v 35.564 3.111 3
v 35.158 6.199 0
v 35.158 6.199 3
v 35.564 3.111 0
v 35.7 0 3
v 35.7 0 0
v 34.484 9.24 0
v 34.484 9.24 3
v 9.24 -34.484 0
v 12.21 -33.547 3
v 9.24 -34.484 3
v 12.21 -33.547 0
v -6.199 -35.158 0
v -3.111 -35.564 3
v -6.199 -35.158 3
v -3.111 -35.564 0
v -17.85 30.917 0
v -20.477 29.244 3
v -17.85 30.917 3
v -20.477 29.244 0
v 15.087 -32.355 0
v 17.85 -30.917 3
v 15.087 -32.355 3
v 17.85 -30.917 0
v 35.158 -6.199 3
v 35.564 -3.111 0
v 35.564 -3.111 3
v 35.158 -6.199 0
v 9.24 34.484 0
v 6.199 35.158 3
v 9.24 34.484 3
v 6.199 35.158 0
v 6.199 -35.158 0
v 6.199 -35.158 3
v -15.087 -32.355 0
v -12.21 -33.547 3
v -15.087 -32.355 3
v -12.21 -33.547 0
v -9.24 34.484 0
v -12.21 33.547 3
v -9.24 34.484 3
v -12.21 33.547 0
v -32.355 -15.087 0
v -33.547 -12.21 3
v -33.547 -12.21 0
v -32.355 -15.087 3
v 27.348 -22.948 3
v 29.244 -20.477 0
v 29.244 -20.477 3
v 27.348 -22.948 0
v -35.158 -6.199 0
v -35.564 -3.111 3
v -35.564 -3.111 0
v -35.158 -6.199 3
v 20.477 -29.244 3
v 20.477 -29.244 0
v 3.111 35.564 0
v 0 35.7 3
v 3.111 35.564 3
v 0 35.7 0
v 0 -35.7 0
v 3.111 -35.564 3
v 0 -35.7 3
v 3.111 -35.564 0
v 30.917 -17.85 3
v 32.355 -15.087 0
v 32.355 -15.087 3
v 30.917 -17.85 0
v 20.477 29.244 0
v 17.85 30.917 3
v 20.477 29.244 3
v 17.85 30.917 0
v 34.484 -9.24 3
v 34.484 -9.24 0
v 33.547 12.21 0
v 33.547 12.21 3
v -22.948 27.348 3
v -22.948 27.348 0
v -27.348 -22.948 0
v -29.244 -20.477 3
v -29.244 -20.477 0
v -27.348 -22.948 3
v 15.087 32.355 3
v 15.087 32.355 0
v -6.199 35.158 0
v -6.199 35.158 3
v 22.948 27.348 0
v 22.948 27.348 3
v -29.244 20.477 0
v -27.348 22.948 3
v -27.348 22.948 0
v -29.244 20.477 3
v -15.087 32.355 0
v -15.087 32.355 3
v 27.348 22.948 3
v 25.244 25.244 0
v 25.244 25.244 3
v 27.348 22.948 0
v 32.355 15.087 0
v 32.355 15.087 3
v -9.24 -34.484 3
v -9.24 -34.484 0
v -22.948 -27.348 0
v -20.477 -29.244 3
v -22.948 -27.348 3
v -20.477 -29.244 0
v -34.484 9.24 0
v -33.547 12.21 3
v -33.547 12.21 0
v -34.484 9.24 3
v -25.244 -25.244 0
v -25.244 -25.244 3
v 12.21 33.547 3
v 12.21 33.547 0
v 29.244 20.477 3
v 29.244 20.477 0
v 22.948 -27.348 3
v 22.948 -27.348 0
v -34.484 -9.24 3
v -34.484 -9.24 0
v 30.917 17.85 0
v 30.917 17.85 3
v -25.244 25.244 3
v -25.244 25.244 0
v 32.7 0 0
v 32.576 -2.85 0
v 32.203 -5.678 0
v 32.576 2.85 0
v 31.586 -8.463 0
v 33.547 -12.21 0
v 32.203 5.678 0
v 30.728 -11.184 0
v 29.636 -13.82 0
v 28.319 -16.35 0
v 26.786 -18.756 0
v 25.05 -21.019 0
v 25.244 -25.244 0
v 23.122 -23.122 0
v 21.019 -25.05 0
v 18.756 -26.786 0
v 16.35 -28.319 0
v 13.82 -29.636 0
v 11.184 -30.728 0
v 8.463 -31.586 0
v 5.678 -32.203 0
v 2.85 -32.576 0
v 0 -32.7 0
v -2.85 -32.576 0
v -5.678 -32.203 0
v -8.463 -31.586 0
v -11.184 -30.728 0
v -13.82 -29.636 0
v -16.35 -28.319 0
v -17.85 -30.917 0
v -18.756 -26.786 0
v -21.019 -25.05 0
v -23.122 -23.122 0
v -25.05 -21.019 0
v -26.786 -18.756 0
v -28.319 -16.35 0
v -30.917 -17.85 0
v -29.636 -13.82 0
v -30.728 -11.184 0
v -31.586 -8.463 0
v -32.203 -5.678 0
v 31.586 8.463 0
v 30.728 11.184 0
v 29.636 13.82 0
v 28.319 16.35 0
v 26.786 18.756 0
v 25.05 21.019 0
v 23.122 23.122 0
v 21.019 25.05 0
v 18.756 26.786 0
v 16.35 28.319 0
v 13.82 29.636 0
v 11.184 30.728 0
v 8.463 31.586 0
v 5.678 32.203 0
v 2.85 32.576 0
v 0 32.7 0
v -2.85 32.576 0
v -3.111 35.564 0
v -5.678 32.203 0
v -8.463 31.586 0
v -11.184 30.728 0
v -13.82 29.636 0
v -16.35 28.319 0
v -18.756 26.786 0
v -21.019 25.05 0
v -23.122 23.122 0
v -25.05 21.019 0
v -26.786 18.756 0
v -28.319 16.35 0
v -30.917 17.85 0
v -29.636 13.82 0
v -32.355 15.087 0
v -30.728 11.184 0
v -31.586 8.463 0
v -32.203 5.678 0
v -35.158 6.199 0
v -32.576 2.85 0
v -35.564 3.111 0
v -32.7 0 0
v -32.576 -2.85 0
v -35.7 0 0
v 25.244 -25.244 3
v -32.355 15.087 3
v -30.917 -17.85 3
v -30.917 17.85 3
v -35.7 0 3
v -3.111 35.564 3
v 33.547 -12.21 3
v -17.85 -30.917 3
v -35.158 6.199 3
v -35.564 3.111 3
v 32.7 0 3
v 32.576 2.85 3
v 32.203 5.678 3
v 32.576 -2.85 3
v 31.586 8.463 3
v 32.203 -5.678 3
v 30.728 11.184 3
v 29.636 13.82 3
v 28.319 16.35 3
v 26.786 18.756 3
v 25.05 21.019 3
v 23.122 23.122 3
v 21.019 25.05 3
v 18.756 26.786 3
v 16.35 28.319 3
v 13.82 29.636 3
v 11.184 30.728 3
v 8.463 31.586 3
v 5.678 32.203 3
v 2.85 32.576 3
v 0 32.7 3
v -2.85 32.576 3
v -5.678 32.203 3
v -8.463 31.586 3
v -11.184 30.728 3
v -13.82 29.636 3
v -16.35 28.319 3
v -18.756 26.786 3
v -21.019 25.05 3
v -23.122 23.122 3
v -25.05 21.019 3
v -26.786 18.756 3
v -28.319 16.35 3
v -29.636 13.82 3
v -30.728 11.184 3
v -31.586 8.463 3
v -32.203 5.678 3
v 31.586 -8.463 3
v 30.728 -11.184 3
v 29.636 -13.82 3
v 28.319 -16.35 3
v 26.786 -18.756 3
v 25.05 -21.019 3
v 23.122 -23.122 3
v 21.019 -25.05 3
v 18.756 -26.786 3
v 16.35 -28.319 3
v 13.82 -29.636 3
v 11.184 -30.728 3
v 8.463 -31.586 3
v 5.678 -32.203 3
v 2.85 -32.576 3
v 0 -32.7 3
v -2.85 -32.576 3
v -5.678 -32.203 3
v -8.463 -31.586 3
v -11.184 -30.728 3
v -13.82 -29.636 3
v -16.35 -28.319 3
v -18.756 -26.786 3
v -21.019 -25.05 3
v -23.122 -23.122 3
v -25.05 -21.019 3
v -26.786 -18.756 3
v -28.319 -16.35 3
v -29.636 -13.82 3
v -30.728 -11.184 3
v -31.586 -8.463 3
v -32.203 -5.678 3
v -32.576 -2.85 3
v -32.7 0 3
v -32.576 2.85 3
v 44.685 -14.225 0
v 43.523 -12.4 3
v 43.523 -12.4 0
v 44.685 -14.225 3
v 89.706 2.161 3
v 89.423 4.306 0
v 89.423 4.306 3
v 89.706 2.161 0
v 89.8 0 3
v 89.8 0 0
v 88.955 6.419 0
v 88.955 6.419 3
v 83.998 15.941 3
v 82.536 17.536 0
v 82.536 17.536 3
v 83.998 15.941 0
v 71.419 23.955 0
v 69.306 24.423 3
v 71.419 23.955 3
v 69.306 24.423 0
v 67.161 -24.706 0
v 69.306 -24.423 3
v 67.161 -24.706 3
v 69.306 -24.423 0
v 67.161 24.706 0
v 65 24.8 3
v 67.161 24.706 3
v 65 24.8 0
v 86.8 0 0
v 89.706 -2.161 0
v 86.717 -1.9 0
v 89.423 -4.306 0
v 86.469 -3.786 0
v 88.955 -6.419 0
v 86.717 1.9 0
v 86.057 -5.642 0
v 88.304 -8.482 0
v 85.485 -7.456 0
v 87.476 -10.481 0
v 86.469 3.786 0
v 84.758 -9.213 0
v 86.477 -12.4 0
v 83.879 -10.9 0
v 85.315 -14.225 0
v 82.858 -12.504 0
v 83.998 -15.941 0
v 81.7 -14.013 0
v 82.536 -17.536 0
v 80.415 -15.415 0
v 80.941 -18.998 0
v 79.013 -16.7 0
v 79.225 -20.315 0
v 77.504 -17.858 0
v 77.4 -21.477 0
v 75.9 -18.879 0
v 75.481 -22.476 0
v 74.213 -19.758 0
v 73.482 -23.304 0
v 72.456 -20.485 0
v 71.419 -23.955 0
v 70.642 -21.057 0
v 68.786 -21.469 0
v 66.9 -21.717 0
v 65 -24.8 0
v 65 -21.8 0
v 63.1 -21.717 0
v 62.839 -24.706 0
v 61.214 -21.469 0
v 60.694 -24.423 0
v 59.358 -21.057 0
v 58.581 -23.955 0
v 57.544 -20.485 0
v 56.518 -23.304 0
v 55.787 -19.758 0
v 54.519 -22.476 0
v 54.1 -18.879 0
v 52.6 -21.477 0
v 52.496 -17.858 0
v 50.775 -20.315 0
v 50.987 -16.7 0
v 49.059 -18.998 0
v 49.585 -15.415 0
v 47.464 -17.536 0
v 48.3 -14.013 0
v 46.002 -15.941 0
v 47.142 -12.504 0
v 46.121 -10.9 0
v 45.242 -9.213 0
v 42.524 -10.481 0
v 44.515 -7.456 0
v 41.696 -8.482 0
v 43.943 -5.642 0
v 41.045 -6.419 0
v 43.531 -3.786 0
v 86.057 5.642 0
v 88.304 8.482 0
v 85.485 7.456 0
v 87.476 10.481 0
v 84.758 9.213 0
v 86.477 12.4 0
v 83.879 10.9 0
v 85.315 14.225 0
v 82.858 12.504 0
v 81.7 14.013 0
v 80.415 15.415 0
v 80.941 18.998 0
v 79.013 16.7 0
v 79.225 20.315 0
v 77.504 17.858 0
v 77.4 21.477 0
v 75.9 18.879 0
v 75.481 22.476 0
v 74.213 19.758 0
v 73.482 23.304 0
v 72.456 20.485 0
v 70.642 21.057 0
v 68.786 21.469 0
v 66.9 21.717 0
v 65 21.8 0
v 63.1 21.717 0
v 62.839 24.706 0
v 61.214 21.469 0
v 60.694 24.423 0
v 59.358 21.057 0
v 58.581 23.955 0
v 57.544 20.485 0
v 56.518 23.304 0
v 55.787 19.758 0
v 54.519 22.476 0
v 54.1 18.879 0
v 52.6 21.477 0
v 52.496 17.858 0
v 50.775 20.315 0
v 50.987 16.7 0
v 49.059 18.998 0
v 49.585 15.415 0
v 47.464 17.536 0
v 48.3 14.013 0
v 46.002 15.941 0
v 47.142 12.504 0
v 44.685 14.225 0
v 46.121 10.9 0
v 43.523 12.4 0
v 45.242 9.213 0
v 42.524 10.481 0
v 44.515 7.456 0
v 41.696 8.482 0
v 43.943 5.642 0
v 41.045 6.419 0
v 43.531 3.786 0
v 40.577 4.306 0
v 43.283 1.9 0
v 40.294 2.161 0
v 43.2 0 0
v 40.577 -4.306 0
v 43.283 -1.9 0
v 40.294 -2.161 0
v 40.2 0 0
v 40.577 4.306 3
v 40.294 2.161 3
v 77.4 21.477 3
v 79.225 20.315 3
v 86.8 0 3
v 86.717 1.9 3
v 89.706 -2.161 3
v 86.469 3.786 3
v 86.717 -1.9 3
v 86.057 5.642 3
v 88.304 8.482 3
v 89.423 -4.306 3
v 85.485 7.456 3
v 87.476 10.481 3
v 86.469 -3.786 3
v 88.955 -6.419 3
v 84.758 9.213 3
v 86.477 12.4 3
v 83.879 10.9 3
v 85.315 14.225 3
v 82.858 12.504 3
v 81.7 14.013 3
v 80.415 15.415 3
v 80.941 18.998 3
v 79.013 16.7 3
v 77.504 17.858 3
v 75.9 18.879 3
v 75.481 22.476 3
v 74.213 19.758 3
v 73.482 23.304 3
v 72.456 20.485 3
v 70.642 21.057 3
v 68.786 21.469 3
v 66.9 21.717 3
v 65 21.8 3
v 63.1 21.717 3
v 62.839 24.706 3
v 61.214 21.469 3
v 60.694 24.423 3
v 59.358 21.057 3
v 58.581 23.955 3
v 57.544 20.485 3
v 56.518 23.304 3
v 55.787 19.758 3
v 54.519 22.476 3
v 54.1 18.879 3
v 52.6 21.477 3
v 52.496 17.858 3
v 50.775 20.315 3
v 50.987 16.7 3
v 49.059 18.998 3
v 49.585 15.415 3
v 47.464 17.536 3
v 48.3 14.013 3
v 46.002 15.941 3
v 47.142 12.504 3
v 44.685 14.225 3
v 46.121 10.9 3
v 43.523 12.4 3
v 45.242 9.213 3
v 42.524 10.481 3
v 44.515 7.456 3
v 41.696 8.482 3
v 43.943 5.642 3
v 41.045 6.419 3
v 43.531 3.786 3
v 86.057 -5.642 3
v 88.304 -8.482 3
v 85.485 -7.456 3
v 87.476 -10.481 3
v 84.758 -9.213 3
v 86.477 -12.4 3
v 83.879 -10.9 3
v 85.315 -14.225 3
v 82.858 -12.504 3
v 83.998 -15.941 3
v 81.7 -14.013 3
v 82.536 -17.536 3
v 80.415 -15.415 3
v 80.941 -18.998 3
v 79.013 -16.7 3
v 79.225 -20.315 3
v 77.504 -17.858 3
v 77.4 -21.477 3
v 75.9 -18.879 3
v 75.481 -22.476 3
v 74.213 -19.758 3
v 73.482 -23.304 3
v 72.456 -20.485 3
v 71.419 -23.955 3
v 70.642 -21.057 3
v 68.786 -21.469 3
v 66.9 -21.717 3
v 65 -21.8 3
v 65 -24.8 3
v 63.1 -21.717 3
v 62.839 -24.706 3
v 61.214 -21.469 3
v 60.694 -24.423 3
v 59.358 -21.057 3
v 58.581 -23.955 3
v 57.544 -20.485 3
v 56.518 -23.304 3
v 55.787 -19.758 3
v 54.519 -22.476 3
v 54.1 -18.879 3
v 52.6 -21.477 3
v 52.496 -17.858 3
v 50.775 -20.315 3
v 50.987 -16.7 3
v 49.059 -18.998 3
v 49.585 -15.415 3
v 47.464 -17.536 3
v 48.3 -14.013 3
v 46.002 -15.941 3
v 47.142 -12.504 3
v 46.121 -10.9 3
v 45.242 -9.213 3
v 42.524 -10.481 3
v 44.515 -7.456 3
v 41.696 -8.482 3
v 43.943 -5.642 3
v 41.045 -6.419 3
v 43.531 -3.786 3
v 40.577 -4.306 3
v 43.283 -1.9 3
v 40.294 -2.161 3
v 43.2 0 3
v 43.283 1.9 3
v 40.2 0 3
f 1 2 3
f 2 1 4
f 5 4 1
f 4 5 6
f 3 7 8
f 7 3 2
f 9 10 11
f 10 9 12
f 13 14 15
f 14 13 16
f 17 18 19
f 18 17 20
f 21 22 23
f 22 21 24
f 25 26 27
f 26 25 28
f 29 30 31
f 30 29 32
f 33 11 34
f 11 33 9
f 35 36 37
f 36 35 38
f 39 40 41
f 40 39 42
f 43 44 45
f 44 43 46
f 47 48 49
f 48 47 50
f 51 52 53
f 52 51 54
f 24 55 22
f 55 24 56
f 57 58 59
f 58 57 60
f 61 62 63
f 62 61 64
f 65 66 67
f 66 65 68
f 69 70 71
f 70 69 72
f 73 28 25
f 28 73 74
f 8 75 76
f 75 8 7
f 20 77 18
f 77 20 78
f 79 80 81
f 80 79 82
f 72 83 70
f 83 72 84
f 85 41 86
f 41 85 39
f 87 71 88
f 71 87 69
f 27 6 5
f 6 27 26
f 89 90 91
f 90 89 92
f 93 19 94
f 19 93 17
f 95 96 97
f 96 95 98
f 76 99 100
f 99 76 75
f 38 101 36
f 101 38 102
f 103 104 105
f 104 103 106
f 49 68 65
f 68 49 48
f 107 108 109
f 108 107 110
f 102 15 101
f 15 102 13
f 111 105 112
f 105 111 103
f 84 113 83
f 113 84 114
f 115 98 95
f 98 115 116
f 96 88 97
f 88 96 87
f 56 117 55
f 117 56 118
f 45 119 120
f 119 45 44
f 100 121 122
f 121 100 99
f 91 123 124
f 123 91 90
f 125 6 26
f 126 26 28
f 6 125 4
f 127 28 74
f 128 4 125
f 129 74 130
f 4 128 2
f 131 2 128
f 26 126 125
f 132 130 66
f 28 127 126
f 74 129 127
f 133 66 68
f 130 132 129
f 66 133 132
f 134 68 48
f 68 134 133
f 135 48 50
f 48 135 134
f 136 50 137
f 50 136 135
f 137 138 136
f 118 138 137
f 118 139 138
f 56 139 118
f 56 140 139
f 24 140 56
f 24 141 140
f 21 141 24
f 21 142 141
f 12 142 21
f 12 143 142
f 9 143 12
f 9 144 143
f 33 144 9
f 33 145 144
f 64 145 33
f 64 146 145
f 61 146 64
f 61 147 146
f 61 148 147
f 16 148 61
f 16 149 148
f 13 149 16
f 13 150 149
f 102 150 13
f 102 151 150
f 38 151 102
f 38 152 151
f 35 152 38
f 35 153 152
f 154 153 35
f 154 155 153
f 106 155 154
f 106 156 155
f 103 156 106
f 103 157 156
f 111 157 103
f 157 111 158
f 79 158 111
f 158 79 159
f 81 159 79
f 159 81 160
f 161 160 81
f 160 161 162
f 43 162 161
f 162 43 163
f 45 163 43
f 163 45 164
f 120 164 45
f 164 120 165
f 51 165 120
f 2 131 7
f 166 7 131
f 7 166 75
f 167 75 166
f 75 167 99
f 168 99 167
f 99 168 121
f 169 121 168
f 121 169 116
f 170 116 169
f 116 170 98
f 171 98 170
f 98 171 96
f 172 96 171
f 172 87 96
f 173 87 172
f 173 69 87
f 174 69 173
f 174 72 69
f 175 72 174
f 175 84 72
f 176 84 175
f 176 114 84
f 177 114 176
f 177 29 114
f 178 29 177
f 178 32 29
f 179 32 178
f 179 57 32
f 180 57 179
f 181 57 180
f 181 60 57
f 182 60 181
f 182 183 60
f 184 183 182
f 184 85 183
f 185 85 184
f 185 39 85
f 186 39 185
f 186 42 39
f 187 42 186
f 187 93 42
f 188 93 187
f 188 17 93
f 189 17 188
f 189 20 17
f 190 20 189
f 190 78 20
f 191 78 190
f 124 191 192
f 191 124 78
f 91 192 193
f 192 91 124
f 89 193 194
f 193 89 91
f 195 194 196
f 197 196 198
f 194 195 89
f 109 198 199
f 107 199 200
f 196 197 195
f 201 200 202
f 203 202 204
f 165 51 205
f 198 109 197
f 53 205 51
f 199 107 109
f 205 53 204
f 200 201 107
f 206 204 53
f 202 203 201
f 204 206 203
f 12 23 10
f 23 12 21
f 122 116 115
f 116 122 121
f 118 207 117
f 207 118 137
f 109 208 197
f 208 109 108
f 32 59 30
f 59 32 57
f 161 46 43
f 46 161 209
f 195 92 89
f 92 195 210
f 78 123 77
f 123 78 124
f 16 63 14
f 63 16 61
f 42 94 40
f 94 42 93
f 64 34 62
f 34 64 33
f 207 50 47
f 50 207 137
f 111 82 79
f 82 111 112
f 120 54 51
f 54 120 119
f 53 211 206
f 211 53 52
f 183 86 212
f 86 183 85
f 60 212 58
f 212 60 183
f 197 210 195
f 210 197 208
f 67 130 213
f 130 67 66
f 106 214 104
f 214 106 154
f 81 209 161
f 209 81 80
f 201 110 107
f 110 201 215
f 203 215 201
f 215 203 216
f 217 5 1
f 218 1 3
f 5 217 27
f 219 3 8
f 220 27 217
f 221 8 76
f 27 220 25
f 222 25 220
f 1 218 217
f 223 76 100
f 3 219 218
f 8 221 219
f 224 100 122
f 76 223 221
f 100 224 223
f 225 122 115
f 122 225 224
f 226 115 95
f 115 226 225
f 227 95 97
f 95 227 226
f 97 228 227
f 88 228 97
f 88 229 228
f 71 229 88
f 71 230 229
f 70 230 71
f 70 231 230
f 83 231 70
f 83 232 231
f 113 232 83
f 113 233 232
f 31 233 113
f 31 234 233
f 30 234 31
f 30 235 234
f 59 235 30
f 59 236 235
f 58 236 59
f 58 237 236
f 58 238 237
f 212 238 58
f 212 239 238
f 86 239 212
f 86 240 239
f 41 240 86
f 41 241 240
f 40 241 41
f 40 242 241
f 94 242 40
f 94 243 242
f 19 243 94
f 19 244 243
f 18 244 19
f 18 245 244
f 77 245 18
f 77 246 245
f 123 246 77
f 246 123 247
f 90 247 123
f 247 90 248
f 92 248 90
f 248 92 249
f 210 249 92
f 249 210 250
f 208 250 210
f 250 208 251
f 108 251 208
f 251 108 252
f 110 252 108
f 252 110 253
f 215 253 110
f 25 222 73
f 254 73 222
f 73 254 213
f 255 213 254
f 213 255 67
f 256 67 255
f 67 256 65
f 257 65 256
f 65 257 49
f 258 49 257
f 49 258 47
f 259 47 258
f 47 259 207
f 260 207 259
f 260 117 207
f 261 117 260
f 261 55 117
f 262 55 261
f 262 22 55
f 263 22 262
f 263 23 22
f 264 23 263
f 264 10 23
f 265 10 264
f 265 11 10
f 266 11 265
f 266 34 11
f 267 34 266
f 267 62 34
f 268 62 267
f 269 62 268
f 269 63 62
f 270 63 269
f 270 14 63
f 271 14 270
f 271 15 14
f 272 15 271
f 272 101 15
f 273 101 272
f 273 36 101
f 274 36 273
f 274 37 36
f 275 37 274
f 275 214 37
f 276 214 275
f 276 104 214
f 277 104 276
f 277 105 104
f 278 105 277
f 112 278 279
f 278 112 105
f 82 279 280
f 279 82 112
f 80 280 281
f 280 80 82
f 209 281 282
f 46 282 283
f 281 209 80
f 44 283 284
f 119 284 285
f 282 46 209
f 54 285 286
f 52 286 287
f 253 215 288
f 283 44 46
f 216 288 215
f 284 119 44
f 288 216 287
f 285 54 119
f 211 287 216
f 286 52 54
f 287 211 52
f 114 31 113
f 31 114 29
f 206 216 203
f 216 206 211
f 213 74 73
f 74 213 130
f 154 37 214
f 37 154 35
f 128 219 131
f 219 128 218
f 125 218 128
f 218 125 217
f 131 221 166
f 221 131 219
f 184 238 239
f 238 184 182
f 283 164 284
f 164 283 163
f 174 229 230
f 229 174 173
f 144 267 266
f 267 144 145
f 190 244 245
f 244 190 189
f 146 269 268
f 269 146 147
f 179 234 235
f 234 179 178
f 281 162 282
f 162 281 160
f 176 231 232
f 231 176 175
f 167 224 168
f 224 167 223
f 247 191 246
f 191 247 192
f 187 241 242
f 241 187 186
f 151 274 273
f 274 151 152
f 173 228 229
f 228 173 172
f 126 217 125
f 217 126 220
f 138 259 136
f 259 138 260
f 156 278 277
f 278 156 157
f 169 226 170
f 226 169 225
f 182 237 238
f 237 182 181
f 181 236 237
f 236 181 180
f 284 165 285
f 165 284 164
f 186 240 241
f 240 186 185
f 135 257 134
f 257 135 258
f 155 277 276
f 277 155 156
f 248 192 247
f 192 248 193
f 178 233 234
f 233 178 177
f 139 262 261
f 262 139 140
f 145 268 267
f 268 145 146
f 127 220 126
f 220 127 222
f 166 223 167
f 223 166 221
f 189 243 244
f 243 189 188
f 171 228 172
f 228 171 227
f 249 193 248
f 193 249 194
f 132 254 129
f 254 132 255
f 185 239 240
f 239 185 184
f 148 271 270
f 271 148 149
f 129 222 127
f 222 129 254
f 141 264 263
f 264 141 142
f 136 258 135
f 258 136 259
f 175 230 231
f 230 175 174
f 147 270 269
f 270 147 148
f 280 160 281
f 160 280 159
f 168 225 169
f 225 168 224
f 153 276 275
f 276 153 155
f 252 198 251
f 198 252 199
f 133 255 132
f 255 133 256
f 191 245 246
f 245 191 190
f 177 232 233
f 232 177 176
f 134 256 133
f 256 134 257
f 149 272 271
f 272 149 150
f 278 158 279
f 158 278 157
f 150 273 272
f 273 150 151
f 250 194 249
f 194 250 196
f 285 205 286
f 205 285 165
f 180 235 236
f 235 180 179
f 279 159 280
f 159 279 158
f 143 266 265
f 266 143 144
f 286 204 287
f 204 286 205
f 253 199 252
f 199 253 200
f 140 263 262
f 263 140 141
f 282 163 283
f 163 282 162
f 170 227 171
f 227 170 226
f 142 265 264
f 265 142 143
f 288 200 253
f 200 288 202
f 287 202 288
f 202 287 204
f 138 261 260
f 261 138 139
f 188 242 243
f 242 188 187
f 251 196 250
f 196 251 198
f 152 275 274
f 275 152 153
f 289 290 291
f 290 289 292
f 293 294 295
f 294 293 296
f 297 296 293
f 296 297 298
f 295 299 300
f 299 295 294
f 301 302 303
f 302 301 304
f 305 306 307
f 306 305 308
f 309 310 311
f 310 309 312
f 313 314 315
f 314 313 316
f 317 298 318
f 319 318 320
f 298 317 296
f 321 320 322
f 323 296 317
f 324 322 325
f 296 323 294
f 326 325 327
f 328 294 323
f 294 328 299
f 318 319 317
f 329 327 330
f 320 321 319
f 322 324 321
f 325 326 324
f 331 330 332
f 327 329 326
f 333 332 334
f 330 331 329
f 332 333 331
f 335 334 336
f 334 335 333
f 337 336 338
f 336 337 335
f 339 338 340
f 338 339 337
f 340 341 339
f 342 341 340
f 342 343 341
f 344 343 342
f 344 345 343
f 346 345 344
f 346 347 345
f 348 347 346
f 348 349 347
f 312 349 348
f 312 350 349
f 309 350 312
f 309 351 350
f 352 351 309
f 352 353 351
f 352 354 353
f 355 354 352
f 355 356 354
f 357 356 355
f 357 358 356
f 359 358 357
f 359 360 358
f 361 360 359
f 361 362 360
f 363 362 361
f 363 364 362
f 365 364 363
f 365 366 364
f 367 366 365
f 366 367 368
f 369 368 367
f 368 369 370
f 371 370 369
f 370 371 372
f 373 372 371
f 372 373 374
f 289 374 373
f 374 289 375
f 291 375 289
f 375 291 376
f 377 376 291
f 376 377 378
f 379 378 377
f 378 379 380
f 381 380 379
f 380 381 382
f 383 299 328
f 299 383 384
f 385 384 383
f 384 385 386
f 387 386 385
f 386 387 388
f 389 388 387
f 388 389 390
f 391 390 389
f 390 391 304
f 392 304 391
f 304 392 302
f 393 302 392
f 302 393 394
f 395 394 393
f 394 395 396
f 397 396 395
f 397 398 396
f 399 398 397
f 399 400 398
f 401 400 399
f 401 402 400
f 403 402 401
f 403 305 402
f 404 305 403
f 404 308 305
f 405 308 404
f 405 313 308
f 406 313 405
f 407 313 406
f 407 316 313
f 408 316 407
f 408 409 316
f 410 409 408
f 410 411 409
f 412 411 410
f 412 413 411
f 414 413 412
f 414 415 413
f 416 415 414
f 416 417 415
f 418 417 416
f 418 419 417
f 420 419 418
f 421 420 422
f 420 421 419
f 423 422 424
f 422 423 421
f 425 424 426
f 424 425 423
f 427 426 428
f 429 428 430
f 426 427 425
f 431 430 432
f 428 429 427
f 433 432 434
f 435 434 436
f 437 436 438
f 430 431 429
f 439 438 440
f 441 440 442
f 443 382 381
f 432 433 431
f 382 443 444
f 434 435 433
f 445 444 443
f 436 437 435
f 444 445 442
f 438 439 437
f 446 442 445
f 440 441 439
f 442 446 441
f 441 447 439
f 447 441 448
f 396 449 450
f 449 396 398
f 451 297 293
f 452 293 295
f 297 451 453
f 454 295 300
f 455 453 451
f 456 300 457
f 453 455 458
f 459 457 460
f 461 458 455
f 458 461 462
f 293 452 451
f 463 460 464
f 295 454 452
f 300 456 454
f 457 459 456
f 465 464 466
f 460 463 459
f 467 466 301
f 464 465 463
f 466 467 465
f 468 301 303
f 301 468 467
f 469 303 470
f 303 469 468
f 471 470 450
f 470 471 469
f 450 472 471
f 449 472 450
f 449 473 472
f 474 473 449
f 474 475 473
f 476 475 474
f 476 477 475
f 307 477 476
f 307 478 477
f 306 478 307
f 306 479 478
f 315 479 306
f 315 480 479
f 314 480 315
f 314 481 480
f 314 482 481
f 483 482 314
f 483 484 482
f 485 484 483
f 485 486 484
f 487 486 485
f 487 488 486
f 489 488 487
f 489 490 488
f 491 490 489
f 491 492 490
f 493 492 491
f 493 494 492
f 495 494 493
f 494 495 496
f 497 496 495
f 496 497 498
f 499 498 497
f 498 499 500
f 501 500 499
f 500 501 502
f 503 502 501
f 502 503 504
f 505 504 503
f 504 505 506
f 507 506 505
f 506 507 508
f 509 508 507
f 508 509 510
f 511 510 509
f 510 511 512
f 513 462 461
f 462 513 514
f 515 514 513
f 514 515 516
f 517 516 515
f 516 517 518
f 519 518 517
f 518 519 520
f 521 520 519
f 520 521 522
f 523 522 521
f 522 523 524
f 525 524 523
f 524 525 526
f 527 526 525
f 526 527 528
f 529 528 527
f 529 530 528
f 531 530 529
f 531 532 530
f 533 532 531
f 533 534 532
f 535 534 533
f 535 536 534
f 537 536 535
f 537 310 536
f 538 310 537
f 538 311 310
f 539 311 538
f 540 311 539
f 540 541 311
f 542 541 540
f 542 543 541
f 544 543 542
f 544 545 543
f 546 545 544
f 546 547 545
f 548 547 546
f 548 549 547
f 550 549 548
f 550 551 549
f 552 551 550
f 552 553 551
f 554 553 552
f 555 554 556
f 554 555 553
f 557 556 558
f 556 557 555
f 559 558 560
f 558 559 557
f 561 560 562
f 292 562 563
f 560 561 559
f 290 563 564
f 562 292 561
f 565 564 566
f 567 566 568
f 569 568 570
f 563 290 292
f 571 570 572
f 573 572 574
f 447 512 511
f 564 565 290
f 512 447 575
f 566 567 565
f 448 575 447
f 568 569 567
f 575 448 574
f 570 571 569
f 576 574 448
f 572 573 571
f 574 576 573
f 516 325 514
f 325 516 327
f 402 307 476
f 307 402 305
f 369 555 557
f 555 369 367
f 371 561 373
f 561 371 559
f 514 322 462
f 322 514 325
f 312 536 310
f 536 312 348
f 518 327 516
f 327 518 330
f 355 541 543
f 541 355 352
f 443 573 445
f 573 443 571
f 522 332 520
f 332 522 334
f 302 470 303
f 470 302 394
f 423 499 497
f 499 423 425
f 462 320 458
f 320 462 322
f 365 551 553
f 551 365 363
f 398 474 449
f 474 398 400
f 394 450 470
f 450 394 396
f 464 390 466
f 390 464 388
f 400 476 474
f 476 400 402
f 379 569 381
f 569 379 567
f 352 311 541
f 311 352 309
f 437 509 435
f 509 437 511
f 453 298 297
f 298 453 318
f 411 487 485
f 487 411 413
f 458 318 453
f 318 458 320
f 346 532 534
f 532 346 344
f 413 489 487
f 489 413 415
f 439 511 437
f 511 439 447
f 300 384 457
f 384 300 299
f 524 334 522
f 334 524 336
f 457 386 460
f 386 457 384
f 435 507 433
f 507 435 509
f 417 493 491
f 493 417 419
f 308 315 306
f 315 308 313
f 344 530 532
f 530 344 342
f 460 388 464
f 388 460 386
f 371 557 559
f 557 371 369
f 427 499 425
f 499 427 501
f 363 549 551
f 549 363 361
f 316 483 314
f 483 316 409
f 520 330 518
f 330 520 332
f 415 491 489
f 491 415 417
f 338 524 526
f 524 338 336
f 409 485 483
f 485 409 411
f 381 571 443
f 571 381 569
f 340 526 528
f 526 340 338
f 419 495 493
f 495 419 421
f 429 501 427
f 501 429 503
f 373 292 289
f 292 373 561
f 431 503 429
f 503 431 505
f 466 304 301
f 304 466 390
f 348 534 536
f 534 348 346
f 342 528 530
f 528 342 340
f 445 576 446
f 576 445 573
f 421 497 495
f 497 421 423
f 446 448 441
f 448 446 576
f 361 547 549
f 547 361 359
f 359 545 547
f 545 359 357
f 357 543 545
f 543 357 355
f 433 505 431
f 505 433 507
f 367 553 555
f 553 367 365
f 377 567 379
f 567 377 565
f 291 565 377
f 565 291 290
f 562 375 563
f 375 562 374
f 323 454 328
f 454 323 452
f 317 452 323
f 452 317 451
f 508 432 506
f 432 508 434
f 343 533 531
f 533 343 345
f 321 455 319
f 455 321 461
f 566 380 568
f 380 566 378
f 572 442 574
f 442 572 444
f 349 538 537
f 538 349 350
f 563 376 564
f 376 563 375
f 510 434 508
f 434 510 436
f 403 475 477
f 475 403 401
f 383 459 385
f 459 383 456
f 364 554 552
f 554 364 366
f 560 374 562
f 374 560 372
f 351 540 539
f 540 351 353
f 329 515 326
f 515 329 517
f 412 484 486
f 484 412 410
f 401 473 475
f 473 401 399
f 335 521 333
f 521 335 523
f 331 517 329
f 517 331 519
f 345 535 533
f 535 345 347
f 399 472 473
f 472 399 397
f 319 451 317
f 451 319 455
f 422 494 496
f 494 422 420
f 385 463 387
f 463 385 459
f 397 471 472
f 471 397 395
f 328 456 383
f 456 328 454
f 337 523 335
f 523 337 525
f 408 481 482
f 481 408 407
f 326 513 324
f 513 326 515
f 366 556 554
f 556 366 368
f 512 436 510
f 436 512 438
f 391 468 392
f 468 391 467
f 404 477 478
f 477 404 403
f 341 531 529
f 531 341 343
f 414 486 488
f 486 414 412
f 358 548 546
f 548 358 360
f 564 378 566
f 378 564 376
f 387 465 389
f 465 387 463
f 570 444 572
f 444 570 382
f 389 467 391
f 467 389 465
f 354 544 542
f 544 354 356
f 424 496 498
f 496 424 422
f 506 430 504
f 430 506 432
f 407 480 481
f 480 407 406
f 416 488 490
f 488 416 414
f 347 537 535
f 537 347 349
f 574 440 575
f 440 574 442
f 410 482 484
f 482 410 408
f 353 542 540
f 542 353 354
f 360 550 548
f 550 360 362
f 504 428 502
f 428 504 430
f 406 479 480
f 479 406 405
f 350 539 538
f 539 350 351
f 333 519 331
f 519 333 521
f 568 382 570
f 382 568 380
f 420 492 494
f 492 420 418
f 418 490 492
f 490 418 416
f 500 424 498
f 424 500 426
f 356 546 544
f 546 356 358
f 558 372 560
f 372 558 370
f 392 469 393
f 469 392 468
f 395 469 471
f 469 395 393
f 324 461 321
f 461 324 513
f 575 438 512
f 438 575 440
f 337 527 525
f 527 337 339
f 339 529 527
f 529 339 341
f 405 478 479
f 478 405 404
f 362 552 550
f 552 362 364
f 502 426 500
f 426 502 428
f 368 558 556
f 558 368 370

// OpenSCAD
// file: hand2_params_a.scad
ov      = 0.05;
d_comp  = 0.4;

d_bear_i = 50;
d_bear_o = 65;
r_bear_i  = ( d_bear_i - d_comp ) / 2;
r_bear_o  = ( d_bear_o + d_comp ) / 2 ;
h_bear    =  7.0;

h_force = 3.0;
l_force = 3.0;
h_all   = h_bear + h_force;
h_ax    = h_all  + 2 * ov;

r_out_b   = 47.0;
r_out_t   = 45.0;

h_main_t = 5.0;
h_fix_t  = 10.0;
h_gap_t = 3.0;
z_t_1 = h_main_t;
z_t_2 = z_t_1 + h_force;
z_t_3 = z_t_2 + h_bear + h_force + h_gap_t;
h_t_a = z_t_3 + 2 * ov;


r_axis  =  4.2; // 4.0 + extra

r_mou   =  2.1;
l_mou   = 40.0;
r_mou2  =  1.7;
h_mou2  =  h_ax;

r_puck_ext = 8.0;
r_mou_ext = 8.6 / 2;
l_mou_ext = r_out_b + r_puck_ext; // + 2; // to get round 55
// main file
$fn = 72;


include <hand2_params_a.scad>


difference(){
  cylinder( r = r_bear_o+3, h = 3 );
  cylinder( r = r_bear_o,   h = 3 );
}

translate([65,0,0])
difference(){
  cylinder( r = r_bear_i, h = 3 );
  cylinder( r = r_bear_i-3,   h = 3 );
}

echo( "l_mou= ", l_mou, " l_mou_ext= ", l_mou_ext, "r_out_b= ", r_out_b );
echo( "h_all= ", h_all, " r_bear_o= ", r_bear_o ); 
